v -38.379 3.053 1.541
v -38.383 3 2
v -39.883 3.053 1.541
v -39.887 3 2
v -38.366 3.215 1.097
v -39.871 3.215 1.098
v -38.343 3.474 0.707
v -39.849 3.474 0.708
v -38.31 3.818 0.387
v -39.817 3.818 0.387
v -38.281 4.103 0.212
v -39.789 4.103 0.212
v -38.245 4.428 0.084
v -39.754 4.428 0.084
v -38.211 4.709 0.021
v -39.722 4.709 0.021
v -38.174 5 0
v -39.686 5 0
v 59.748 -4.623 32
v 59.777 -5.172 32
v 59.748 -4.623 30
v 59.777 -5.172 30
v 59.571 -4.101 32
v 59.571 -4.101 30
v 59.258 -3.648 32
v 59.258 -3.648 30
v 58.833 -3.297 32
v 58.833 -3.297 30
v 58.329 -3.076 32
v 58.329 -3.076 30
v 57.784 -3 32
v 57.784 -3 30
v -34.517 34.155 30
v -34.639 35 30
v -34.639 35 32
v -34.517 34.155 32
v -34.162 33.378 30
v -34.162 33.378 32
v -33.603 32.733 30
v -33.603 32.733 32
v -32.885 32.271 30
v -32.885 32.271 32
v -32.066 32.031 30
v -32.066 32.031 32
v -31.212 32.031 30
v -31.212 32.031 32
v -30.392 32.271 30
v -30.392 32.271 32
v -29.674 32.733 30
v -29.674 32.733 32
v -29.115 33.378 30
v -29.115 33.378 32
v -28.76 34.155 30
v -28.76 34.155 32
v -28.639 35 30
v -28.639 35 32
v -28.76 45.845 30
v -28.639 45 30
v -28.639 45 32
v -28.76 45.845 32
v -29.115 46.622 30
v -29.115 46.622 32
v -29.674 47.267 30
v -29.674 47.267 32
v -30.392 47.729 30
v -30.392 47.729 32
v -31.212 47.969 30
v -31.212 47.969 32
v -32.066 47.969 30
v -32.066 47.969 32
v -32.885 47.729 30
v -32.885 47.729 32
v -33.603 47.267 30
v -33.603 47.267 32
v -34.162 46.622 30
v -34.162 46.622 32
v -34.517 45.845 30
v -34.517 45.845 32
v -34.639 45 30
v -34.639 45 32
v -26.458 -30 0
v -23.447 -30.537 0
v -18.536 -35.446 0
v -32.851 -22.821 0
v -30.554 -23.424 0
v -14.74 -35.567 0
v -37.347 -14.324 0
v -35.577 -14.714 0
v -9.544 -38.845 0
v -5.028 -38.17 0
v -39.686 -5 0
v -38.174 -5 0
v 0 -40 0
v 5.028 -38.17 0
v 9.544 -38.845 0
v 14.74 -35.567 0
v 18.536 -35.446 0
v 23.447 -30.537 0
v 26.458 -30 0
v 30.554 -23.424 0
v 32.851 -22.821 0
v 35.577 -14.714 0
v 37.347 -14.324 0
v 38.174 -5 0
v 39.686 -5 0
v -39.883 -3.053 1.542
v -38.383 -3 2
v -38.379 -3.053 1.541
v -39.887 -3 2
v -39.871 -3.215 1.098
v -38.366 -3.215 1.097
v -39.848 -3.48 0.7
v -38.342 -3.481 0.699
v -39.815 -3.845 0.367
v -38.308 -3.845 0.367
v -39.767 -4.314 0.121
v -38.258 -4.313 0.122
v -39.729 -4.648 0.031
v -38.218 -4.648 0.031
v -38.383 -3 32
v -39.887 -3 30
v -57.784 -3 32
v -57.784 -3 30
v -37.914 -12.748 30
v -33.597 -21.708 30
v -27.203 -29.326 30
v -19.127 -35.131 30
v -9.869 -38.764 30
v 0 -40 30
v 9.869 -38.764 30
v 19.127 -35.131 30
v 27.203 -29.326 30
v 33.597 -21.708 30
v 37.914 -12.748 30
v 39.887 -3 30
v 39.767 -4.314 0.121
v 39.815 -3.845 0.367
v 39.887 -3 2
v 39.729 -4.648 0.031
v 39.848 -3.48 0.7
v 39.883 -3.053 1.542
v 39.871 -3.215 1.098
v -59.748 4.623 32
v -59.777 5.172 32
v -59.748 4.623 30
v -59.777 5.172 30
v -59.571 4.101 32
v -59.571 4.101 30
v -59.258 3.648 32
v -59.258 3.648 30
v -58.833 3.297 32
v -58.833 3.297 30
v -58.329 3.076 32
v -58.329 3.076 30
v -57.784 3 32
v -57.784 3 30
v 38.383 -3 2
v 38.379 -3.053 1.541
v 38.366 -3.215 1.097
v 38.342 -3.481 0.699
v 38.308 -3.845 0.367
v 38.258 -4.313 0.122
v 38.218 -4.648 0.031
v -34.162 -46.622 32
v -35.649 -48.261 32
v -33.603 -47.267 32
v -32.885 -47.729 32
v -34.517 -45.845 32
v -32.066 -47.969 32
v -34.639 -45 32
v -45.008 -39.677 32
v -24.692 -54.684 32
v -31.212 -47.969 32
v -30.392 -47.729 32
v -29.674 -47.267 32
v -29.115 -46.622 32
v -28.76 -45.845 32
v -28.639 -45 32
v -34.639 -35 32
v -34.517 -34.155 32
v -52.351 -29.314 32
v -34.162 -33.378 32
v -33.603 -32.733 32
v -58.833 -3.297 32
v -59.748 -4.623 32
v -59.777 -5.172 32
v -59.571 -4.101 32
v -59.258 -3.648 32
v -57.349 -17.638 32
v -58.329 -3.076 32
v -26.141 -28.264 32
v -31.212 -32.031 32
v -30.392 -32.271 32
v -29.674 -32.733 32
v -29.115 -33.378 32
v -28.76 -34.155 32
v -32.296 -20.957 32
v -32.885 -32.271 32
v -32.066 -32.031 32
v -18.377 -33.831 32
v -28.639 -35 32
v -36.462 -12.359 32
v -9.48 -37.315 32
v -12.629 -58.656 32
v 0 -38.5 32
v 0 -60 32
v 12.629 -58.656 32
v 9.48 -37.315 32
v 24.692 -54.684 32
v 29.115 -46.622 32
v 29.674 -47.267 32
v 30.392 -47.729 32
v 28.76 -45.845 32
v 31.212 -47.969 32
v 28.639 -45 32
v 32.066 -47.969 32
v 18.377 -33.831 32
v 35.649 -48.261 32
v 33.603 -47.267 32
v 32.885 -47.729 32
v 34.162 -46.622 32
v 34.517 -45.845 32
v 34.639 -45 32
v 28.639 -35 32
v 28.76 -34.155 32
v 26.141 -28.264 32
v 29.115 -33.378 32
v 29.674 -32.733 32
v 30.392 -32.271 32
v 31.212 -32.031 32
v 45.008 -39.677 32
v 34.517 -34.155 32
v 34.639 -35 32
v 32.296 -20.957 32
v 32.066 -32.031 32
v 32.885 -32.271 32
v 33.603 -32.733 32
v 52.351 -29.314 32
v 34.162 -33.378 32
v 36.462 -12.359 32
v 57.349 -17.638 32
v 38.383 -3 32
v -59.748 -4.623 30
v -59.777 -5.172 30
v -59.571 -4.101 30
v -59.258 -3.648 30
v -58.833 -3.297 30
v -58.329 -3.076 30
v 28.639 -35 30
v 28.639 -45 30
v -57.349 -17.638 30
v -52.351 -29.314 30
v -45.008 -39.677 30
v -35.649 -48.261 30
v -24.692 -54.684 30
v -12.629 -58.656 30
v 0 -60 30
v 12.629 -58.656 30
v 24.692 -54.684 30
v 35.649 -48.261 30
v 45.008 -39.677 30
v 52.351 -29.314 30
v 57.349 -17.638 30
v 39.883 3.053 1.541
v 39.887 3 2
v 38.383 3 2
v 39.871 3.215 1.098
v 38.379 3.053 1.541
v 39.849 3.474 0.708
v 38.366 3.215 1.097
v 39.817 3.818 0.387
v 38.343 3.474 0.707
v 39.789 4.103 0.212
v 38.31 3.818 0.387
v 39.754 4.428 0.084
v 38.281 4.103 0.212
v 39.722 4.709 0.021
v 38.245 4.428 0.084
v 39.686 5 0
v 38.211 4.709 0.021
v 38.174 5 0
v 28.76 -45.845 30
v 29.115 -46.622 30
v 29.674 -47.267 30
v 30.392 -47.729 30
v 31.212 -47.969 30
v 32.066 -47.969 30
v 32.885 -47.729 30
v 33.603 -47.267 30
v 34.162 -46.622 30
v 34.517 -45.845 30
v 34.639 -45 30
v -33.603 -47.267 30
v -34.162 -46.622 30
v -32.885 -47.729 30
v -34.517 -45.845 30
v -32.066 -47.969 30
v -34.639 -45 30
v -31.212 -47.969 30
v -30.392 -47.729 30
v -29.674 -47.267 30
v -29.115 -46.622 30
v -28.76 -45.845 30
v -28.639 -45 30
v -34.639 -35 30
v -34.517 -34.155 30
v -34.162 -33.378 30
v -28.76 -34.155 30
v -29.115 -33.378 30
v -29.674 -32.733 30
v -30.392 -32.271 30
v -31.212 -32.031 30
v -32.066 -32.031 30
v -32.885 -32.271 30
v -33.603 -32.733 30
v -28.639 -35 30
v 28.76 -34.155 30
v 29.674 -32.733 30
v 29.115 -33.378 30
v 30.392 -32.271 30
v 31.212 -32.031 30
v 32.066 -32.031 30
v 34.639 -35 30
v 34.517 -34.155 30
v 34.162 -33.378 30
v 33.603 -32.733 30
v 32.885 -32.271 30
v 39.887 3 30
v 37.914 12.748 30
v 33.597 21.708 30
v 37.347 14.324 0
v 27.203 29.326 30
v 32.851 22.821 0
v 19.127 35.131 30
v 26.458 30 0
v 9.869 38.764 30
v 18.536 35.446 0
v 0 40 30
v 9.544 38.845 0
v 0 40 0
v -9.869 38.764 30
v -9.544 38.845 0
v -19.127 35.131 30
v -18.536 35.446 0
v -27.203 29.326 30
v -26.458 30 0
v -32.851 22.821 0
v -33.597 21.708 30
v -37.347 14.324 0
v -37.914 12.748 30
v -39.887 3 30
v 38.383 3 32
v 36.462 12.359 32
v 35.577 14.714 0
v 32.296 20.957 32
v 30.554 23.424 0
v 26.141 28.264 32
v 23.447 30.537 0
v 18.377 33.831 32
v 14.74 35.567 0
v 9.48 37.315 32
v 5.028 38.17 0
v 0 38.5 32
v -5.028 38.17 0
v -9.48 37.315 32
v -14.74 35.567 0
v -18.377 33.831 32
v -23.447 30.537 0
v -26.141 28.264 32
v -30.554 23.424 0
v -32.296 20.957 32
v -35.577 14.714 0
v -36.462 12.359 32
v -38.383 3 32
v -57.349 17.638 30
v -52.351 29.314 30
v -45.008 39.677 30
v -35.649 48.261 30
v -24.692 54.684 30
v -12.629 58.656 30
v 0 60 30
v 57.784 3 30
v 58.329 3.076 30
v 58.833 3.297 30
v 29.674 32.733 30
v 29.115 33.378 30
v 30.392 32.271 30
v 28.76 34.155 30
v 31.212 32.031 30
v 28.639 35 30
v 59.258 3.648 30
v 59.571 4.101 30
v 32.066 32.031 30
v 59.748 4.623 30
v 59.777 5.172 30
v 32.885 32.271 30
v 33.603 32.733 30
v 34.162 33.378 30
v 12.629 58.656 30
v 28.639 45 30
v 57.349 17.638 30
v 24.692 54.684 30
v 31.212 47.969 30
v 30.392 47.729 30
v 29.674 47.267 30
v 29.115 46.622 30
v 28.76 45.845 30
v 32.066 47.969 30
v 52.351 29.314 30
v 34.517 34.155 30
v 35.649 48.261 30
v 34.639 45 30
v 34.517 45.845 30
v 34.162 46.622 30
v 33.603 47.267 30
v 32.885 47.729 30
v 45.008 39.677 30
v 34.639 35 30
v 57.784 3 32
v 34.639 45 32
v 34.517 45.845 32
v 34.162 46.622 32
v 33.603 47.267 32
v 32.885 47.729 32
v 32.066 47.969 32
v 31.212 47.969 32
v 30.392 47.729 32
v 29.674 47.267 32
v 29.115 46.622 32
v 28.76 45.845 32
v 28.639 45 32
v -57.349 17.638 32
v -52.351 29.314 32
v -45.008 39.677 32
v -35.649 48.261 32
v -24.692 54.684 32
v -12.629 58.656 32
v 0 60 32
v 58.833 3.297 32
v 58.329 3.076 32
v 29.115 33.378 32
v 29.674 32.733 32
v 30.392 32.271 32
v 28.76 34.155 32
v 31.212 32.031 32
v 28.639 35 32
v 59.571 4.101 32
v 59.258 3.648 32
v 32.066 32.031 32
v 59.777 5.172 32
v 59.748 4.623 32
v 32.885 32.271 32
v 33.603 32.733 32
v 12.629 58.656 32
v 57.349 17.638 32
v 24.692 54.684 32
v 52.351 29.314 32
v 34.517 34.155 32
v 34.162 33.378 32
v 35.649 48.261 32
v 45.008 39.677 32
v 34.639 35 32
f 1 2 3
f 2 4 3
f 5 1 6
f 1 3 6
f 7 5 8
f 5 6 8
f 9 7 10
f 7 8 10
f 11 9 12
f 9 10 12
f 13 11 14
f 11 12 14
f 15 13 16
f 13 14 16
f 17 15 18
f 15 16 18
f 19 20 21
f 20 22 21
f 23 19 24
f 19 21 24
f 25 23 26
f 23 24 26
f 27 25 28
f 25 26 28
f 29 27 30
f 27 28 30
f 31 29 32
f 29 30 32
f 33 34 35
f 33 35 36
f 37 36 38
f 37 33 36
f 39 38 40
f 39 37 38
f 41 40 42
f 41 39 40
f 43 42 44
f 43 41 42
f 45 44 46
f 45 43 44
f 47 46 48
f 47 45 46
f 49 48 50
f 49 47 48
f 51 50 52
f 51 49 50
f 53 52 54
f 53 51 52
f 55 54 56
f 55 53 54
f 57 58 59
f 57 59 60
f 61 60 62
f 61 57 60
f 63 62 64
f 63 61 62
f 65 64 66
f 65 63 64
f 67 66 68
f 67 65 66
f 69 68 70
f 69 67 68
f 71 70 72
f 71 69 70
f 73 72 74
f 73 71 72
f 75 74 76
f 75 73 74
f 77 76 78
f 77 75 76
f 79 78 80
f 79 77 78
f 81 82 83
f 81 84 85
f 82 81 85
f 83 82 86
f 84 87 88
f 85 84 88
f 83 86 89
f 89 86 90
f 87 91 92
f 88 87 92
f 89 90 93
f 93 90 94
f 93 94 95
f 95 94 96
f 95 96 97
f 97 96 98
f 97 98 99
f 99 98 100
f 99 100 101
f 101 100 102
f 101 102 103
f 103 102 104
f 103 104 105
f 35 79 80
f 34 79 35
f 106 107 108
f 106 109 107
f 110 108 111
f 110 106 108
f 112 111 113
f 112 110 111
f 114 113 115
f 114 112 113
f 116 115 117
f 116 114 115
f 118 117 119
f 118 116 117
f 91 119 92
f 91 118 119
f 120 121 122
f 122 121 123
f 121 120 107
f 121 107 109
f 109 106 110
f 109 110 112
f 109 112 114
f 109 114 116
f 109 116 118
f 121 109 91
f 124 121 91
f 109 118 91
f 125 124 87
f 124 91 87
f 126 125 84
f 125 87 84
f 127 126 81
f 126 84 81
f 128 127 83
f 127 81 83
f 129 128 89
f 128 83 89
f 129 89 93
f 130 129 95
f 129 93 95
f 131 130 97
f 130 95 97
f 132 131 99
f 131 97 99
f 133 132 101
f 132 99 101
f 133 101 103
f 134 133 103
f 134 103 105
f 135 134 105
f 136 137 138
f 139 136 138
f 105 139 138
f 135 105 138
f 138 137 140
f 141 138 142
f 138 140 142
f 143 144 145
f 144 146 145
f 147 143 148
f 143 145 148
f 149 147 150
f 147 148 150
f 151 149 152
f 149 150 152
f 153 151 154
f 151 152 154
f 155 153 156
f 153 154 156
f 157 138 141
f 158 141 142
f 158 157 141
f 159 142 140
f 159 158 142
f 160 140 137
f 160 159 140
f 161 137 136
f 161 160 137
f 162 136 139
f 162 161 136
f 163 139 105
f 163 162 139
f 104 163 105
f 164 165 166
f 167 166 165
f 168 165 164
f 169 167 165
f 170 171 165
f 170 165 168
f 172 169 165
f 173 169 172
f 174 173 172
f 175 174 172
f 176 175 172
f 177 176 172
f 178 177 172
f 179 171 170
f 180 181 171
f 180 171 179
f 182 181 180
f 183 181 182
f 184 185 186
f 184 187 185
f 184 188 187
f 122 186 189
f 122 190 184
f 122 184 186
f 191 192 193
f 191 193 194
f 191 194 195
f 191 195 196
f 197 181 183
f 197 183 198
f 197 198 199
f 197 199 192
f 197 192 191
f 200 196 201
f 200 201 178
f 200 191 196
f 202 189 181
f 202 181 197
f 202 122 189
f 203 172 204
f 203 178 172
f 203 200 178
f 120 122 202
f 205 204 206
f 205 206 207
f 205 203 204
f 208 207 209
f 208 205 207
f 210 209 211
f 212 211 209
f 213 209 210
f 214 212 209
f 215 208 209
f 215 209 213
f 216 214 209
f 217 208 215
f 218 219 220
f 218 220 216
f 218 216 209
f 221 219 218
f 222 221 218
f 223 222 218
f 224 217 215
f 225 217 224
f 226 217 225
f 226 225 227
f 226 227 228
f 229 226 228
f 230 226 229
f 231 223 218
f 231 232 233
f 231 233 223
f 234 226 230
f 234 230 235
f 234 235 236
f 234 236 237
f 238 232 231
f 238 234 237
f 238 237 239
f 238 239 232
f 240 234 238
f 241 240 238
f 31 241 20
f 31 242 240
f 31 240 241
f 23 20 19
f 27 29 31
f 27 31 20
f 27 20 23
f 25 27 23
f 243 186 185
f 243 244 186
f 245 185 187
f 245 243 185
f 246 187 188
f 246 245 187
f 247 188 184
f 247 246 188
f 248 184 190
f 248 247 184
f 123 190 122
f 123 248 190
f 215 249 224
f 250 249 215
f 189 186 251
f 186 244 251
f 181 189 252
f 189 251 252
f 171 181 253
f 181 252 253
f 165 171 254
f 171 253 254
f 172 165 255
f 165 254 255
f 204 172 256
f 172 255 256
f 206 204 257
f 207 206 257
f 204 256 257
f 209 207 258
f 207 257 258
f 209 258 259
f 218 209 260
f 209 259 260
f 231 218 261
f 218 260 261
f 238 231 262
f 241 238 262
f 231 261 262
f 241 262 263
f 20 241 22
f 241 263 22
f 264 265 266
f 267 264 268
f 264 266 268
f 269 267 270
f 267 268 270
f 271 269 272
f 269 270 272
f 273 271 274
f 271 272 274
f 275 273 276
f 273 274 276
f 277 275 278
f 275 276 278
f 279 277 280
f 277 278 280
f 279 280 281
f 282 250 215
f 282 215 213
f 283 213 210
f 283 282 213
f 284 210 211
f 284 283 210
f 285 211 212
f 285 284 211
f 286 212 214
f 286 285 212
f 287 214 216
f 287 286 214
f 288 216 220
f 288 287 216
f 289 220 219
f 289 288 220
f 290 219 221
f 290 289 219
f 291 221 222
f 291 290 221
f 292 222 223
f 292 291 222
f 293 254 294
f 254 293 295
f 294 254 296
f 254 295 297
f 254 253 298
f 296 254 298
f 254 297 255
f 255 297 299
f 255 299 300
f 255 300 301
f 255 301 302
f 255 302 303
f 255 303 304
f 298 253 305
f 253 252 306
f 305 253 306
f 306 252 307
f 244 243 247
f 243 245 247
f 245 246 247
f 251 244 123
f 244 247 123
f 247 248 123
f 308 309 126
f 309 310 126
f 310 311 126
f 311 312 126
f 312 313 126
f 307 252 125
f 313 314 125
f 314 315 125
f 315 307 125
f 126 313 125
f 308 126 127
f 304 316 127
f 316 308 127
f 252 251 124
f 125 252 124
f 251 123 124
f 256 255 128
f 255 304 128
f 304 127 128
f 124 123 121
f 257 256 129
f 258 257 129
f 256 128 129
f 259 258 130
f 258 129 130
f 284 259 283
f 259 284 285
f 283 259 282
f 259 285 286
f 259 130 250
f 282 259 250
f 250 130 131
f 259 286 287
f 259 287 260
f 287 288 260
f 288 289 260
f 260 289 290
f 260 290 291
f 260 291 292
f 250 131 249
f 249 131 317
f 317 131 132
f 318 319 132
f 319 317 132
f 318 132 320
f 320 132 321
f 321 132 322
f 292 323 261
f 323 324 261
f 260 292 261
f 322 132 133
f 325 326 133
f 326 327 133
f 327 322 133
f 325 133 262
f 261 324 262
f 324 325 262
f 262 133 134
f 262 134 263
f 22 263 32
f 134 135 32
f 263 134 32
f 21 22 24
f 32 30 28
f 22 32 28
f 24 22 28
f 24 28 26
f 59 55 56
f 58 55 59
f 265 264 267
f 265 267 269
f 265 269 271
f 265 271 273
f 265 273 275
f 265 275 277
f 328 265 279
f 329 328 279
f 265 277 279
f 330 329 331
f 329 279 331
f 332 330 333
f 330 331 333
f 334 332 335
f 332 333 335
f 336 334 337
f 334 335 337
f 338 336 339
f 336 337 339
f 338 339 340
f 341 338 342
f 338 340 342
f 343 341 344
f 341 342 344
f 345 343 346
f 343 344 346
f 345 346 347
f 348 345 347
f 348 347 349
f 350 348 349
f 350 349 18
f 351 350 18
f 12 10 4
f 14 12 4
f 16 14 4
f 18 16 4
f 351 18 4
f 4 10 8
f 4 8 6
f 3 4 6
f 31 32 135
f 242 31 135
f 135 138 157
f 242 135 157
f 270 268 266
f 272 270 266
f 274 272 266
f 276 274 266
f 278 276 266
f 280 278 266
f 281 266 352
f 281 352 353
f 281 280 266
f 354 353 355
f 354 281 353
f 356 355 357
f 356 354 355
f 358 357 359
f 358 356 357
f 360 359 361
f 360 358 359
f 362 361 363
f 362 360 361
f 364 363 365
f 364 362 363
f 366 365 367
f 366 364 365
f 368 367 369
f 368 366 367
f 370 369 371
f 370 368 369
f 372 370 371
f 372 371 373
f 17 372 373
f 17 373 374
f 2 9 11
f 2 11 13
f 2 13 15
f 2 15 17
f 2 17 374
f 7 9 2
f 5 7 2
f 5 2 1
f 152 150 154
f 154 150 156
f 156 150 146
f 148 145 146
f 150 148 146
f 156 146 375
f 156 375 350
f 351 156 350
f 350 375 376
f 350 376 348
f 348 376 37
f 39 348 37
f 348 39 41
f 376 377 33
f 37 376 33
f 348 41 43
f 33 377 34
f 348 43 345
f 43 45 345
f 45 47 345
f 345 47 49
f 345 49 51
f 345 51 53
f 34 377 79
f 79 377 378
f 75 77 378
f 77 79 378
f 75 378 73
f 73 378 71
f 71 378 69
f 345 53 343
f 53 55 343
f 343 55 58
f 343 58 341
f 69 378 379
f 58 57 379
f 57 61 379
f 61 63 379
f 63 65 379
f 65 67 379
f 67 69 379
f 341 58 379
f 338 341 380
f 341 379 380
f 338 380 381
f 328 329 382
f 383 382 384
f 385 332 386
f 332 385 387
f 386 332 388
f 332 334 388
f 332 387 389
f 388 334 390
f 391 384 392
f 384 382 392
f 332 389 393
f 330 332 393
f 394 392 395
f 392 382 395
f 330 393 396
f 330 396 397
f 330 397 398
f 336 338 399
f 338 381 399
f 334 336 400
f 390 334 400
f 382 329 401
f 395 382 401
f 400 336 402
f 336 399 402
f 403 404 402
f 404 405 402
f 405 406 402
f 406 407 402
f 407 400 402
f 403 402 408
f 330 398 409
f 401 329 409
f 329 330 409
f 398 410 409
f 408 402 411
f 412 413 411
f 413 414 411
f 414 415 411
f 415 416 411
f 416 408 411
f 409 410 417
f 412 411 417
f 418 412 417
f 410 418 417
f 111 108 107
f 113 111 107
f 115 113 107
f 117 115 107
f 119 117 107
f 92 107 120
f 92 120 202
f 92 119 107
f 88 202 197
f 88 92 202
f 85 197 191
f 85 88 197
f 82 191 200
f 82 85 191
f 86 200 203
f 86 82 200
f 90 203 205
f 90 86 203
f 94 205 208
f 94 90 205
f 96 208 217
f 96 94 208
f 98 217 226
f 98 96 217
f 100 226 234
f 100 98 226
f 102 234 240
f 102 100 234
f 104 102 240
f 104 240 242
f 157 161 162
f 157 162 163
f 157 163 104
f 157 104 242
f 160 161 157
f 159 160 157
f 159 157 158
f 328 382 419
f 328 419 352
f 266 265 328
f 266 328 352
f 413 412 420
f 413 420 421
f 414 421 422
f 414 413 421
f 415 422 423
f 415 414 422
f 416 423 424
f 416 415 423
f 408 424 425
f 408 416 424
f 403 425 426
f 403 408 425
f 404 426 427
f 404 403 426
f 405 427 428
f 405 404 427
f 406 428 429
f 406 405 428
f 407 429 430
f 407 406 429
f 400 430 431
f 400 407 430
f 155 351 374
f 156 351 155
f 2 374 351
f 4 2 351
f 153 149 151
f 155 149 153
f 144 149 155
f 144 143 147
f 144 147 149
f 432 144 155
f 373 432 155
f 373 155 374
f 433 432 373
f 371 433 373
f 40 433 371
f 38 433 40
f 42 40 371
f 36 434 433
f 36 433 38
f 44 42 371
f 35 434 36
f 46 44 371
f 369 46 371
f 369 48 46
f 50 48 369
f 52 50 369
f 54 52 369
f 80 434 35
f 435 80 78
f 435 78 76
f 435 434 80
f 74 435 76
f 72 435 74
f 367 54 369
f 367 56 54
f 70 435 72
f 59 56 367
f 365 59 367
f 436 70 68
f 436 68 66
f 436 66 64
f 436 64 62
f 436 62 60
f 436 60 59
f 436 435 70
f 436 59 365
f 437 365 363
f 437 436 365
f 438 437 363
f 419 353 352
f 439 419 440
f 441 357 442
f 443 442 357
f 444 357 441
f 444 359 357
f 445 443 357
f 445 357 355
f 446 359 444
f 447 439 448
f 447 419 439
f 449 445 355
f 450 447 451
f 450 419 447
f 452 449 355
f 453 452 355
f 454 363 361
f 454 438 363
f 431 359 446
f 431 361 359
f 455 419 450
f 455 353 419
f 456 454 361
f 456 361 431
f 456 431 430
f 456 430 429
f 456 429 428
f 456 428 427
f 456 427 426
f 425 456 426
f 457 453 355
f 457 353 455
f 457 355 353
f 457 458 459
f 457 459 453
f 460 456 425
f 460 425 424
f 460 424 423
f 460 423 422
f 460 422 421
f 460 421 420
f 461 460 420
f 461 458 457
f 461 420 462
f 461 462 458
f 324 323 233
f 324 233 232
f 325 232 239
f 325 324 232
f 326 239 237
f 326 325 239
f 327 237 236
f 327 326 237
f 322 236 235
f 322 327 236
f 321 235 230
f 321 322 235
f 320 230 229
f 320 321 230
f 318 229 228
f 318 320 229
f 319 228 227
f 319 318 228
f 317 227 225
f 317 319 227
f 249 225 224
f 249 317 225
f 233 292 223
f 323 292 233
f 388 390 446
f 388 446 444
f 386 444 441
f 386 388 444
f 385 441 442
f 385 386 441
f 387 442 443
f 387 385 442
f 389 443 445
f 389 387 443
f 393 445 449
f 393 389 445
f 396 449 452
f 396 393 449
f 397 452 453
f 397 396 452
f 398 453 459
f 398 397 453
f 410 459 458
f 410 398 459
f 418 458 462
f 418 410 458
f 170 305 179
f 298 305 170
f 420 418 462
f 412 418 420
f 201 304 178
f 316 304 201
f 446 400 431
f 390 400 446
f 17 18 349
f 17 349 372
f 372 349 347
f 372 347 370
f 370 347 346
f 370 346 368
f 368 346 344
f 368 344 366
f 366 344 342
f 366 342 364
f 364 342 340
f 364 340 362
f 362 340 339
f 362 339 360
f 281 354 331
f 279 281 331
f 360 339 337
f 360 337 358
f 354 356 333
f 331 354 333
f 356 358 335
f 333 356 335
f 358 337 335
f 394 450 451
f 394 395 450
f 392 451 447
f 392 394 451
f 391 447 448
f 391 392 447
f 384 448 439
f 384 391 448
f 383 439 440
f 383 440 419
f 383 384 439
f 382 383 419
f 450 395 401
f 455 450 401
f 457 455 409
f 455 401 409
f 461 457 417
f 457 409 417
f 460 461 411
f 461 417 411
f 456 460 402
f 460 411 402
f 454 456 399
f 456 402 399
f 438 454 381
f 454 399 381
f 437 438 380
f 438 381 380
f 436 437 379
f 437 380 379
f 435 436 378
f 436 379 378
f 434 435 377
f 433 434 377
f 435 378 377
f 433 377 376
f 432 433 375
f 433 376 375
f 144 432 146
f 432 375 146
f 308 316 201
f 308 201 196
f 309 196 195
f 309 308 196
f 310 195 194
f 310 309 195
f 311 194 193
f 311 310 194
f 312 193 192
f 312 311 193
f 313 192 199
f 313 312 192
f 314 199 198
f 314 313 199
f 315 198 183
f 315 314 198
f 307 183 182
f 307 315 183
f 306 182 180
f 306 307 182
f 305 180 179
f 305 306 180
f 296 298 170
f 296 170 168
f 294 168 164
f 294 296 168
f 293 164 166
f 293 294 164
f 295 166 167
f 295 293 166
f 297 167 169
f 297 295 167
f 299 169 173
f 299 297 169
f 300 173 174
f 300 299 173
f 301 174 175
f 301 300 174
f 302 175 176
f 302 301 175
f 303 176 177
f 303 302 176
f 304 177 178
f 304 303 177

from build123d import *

# Parameters (mm, degrees)
SKETCH_1_R          = 40
SKETCH_1_R_2        = 38.5
EXTRUDE_1_DEPTH     = 30
SKETCH_3_R          = 60
SKETCH_3_R_2        = 38.5
EXTRUDE_2_DEPTH     = 2
CUT_EXTRUDE_3_DEPTH = 91
SKETCH_2_W          = 200
SKETCH_2_H          = 6
CUT_EXTRUDE_2_DEPTH = 2000
FILLET_1_R          = 2
FILLET_2_R          = 2


with BuildPart() as part:
    # 草图1 → 凸台-拉伸1 (new body)
    with BuildSketch(Plane.XY):
        Circle(SKETCH_1_R)
        Circle(SKETCH_1_R_2, mode=Mode.SUBTRACT)
    extrude(amount=EXTRUDE_1_DEPTH)

    # 草图3 → 凸台-拉伸2 (add)
    with BuildSketch(Plane.XY.offset(30)):
        Circle(SKETCH_3_R)
        Circle(SKETCH_3_R_2, mode=Mode.SUBTRACT)
    extrude(amount=EXTRUDE_2_DEPTH)

    # 草图4 → 切除-拉伸3 (cut, through all)
    with BuildSketch(Plane(origin=(0, 0, 30), x_dir=(-1, 0, 0), z_dir=(0, 0, -1))):
        with BuildLine():
            Line((-34.638584039, -45), (-34.638584039, -35))
            ThreePointArc((-34.638584039, -35), (-31.638584039, -32), (-28.638584039, -35))
            Line((-28.638584039, -35), (-28.638584039, -45))
            ThreePointArc((-28.638584039, -45), (-31.638584039, -48), (-34.638584039, -45))
        make_face()
        with BuildLine():
            Line((28.638584039, -45), (28.638584039, -35))
            ThreePointArc((28.638584039, -35), (31.638584039, -32), (34.638584039, -35))
            Line((34.638584039, -35), (34.638584039, -45))
            ThreePointArc((34.638584039, -45), (31.638584039, -48), (28.638584039, -45))
        make_face()
        with BuildLine():
            Line((28.638584039, 35), (28.638584039, 45))
            ThreePointArc((28.638584039, 45), (31.638584039, 48), (34.638584039, 45))
            Line((34.638584039, 45), (34.638584039, 35))
            ThreePointArc((34.638584039, 35), (31.638584039, 32), (28.638584039, 35))
        make_face()
        with BuildLine():
            Line((-34.638584039, 35), (-34.638584039, 45))
            ThreePointArc((-34.638584039, 45), (-31.638584039, 48), (-28.638584039, 45))
            Line((-28.638584039, 45), (-28.638584039, 35))
            ThreePointArc((-28.638584039, 35), (-31.638584039, 32), (-34.638584039, 35))
        make_face()
    extrude(amount=-CUT_EXTRUDE_3_DEPTH, mode=Mode.SUBTRACT)

    # 草图2 → 切除-拉伸2 (cut)
    with BuildSketch(Plane(origin=(0, 0, 0), x_dir=(-1, 0, 0), z_dir=(0, 0, -1))):
        Rectangle(SKETCH_2_W, SKETCH_2_H)
    extrude(amount=-CUT_EXTRUDE_2_DEPTH, mode=Mode.SUBTRACT)


with BuildPart() as cut_extrude_2_piece_1:
    # of the separate pieces the step leaves, piece 1, a body of its own (cut_extrude_2_pieces)
    add(part.part.solids().sort_by_distance((-39.88734135, -3, 0))[0])

    # 圆角1
    fillet_1_edges = [cut_extrude_2_piece_1.edges().sort_by_distance(p)[0] for p in [
        (59.924953066, -3, 31),
        (-59.924953066, -3, 31),
        (-39.135140134, -3, 0),
        (39.135140134, -3, 0),
    ]]
    fillet(fillet_1_edges, radius=FILLET_1_R)


with BuildPart() as cut_extrude_2_piece_2:
    # of the separate pieces the step leaves, piece 2, a body of its own (cut_extrude_2_pieces)
    add(part.part.solids().sort_by_distance((39.88734135, 3, 0))[0])

    # 圆角2
    fillet_2_edges = [cut_extrude_2_piece_2.edges().sort_by_distance(p)[0] for p in [
        (59.924953066, 3, 31),
        (-59.924953066, 3, 31),
        (-39.135140134, 3, 0),
        (39.135140134, 3, 0),
    ]]
    fillet(fillet_2_edges, radius=FILLET_2_R)


solid = Compound([cut_extrude_2_piece_1.part, cut_extrude_2_piece_2.part])
